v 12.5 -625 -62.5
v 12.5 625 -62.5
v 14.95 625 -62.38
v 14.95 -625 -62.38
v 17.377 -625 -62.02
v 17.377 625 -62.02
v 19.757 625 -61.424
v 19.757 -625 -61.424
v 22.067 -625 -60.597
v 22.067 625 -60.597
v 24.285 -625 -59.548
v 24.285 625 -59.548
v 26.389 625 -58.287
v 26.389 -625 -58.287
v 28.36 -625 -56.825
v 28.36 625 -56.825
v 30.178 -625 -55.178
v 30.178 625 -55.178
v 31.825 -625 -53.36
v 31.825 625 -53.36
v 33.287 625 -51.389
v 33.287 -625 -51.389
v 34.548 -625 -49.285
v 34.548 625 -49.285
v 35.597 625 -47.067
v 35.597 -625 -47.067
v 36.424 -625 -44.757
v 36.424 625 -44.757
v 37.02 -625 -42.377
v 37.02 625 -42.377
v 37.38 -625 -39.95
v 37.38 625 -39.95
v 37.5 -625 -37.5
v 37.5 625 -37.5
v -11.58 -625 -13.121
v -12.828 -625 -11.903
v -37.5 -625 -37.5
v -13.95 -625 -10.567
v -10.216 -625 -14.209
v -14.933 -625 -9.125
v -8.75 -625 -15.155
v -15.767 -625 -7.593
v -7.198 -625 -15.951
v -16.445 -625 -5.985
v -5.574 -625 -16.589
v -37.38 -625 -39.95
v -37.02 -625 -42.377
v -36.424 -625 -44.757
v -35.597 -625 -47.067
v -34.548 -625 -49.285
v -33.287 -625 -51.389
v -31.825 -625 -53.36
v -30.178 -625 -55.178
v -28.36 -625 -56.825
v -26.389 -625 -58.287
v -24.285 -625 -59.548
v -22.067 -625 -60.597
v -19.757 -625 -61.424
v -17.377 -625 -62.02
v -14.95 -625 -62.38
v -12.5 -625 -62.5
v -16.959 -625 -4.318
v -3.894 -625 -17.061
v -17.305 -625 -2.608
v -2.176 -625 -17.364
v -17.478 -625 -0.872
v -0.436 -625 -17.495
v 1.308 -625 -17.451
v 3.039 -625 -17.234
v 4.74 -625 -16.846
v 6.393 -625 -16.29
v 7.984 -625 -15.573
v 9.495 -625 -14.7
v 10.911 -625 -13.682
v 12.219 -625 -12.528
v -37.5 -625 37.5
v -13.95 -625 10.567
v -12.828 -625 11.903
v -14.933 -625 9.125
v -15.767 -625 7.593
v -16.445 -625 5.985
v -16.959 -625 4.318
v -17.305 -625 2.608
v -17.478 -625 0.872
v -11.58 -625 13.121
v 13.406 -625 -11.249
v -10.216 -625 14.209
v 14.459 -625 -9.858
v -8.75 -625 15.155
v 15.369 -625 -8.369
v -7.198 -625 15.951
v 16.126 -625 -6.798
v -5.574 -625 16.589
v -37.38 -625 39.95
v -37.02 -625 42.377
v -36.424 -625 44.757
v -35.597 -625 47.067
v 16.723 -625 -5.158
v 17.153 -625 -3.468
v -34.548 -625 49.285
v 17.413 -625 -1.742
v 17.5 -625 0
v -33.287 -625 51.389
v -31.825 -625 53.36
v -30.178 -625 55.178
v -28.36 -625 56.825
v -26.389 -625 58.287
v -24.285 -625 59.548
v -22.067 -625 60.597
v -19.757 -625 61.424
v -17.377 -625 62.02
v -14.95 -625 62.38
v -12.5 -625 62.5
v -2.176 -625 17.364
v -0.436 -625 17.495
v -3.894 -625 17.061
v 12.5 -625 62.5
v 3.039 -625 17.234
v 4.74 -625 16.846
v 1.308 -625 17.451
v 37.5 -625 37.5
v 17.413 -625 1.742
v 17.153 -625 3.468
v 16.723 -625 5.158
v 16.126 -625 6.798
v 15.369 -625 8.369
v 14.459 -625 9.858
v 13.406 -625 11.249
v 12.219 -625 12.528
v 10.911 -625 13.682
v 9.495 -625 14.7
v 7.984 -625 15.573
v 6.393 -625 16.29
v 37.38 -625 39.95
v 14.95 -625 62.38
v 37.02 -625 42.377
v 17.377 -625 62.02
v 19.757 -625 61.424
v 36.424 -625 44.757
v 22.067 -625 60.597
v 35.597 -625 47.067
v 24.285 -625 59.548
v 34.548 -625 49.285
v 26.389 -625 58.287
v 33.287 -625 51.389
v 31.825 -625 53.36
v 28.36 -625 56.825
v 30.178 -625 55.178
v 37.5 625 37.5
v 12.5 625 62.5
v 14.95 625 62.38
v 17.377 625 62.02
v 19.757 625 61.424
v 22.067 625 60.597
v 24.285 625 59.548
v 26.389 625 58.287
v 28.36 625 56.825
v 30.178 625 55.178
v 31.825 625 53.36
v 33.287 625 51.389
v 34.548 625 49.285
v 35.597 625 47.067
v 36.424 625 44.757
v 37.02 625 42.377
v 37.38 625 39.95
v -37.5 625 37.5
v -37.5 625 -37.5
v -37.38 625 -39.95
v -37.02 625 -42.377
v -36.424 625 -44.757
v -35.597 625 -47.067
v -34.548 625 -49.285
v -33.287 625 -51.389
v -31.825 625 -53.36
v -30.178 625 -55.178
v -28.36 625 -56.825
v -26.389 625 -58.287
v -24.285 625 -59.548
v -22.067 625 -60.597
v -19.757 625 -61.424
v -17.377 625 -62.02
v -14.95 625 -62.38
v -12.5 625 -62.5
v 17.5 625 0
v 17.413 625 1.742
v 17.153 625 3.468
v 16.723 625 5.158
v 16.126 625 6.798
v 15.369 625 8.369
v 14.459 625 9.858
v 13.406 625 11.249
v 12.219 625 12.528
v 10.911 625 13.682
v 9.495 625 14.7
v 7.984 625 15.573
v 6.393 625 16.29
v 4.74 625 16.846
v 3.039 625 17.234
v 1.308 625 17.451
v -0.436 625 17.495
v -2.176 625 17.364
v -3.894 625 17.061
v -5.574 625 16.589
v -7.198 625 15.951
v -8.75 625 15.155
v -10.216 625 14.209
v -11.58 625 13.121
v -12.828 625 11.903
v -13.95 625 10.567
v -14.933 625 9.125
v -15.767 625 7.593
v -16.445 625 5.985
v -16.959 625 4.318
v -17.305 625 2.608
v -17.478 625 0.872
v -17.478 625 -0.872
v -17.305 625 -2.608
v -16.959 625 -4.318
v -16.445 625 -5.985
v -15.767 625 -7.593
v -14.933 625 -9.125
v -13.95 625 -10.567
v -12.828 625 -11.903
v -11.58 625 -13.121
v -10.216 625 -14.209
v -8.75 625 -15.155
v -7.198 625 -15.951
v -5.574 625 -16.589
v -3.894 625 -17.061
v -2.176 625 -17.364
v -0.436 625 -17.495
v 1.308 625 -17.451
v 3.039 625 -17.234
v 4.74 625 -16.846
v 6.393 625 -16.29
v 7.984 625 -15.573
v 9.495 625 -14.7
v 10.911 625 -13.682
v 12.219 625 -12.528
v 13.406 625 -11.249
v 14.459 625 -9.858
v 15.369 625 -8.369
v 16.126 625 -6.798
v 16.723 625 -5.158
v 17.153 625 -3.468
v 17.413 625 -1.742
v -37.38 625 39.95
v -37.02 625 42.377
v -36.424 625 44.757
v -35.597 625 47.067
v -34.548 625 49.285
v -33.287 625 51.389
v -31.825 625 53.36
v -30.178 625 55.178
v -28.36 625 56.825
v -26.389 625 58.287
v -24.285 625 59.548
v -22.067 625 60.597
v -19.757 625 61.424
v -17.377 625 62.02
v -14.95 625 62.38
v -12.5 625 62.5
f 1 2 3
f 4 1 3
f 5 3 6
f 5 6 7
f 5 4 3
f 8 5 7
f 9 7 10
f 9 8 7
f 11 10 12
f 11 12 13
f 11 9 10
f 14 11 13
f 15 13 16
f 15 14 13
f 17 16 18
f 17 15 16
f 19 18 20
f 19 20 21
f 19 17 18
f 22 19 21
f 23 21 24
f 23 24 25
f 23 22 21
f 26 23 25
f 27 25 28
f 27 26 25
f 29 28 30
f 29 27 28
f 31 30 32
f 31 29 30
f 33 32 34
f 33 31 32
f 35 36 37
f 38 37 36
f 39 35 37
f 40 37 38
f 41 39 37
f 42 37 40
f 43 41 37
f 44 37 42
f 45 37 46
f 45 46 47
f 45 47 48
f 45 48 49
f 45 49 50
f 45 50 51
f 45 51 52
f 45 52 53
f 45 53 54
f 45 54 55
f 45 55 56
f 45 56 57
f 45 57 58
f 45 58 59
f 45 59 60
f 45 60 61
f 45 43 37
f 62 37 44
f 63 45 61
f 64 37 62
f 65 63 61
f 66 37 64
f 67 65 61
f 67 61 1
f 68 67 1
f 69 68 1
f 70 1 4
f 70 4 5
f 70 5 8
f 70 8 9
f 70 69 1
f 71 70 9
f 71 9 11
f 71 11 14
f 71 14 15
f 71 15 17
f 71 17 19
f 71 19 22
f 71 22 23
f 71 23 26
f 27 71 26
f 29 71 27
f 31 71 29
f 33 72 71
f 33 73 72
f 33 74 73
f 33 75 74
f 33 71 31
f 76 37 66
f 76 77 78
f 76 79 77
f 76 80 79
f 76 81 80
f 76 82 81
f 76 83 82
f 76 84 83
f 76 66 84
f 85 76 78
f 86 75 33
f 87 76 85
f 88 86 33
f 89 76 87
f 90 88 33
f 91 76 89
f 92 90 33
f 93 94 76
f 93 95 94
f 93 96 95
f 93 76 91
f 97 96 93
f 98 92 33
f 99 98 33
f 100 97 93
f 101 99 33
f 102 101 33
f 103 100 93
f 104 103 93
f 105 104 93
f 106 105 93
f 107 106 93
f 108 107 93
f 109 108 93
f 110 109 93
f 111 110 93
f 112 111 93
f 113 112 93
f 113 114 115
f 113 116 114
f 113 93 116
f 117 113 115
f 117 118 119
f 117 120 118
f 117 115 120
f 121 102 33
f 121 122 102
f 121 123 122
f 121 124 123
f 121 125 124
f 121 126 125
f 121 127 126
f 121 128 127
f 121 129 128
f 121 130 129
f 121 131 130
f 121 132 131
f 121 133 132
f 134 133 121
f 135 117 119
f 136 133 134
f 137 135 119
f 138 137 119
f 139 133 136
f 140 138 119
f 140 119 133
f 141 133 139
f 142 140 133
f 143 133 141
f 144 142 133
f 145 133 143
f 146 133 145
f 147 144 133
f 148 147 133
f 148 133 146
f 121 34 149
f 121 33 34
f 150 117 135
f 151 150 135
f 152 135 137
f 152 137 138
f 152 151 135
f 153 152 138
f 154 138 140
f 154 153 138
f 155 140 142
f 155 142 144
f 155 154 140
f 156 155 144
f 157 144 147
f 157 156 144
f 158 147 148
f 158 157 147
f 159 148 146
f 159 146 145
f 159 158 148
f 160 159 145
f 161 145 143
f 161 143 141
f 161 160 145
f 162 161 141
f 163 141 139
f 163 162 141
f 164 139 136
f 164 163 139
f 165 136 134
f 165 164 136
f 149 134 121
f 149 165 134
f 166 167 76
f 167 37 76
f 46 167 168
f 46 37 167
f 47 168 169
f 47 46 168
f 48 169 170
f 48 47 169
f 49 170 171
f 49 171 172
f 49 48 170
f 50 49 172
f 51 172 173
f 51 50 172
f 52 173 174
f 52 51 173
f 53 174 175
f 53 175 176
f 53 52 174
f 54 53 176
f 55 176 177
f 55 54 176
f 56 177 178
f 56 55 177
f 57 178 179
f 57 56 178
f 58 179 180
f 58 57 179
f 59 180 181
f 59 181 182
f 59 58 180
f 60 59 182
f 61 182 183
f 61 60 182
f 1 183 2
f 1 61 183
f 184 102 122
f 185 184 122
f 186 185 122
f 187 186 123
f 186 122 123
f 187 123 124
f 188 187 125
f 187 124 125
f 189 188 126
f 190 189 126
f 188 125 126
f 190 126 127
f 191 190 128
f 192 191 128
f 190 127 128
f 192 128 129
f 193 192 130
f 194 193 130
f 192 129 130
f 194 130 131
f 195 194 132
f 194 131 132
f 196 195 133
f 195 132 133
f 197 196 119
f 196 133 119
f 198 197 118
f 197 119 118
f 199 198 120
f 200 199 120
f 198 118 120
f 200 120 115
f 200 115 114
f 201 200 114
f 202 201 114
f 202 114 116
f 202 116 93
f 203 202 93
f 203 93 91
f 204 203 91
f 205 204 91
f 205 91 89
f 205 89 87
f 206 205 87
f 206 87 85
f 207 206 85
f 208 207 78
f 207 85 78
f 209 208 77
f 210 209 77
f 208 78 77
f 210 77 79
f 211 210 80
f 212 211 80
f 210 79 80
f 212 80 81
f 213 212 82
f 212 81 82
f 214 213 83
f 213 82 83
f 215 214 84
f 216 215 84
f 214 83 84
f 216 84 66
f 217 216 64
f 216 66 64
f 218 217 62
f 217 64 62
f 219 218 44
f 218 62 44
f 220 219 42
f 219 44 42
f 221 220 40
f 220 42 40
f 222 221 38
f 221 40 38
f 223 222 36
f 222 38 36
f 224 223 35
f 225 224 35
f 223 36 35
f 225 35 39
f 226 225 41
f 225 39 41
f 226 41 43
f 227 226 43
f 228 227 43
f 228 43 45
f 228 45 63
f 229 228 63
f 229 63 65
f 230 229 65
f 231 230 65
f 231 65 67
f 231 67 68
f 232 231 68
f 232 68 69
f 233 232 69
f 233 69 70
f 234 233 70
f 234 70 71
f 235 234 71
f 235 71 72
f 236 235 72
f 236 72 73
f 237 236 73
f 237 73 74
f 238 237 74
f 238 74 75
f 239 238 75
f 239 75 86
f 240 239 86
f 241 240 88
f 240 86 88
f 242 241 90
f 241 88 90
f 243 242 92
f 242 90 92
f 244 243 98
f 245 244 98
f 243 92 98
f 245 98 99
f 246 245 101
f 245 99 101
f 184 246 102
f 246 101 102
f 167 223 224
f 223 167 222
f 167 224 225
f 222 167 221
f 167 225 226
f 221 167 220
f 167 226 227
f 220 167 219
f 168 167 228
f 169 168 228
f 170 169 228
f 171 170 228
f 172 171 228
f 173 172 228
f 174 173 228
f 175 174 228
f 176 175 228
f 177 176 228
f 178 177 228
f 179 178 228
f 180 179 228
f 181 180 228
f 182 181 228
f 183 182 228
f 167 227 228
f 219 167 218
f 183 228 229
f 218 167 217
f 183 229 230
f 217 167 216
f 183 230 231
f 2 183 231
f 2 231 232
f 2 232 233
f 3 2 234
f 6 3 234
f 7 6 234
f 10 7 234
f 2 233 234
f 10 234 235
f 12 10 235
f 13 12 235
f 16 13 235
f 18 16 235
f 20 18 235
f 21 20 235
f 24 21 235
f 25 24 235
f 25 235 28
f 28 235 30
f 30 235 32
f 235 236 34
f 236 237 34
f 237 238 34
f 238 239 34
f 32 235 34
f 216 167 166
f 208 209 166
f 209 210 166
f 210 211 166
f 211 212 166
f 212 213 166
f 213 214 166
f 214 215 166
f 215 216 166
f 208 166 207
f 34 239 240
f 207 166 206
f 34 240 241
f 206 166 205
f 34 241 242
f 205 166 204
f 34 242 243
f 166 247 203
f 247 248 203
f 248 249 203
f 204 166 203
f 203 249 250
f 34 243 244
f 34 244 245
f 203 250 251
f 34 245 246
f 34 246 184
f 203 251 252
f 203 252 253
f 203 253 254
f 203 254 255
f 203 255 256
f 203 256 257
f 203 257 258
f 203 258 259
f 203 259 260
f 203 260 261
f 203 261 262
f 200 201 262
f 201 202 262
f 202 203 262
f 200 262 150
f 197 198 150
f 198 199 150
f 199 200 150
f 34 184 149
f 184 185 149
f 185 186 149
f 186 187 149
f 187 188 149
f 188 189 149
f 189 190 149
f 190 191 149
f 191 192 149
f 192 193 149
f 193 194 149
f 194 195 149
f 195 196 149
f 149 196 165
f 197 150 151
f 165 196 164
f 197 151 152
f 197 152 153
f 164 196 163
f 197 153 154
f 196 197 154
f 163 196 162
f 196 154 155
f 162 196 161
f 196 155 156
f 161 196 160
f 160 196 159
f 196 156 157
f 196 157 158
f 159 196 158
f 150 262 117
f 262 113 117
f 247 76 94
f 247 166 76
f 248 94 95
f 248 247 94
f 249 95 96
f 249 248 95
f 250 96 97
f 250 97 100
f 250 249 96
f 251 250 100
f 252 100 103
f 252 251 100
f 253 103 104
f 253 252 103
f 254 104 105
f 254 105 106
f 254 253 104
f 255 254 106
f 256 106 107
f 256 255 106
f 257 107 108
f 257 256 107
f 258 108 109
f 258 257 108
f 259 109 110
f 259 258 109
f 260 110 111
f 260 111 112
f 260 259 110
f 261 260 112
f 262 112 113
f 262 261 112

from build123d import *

# Parameters (mm, degrees)
F0_W     = 75
F0_H     = 125
F1_DEPTH = 625
F2_R     = 17.5
F3_DEPTH = 1250
F4_R     = 25


with BuildPart() as f1:
    # F0 (on Front) → F1 (new body, symmetric)
    with BuildSketch(Plane.XZ):
        Rectangle(F0_W, F0_H)
    extrude(amount=F1_DEPTH, both=True)

    # F2 (on face) → F3 (cut)
    with BuildSketch(Plane.XZ.offset(625)):
        Circle(F2_R)
    extrude(amount=-F3_DEPTH, mode=Mode.SUBTRACT)

    # F4
    f4_edges = [f1.edges().sort_by_distance(p)[0] for p in [
        (37.5, 0, 62.5),
        (-37.5, 0, 62.5),
        (-37.5, 0, -62.5),
        (37.5, 0, -62.5),
    ]]
    fillet(f4_edges, radius=F4_R)


solid = f1.part
